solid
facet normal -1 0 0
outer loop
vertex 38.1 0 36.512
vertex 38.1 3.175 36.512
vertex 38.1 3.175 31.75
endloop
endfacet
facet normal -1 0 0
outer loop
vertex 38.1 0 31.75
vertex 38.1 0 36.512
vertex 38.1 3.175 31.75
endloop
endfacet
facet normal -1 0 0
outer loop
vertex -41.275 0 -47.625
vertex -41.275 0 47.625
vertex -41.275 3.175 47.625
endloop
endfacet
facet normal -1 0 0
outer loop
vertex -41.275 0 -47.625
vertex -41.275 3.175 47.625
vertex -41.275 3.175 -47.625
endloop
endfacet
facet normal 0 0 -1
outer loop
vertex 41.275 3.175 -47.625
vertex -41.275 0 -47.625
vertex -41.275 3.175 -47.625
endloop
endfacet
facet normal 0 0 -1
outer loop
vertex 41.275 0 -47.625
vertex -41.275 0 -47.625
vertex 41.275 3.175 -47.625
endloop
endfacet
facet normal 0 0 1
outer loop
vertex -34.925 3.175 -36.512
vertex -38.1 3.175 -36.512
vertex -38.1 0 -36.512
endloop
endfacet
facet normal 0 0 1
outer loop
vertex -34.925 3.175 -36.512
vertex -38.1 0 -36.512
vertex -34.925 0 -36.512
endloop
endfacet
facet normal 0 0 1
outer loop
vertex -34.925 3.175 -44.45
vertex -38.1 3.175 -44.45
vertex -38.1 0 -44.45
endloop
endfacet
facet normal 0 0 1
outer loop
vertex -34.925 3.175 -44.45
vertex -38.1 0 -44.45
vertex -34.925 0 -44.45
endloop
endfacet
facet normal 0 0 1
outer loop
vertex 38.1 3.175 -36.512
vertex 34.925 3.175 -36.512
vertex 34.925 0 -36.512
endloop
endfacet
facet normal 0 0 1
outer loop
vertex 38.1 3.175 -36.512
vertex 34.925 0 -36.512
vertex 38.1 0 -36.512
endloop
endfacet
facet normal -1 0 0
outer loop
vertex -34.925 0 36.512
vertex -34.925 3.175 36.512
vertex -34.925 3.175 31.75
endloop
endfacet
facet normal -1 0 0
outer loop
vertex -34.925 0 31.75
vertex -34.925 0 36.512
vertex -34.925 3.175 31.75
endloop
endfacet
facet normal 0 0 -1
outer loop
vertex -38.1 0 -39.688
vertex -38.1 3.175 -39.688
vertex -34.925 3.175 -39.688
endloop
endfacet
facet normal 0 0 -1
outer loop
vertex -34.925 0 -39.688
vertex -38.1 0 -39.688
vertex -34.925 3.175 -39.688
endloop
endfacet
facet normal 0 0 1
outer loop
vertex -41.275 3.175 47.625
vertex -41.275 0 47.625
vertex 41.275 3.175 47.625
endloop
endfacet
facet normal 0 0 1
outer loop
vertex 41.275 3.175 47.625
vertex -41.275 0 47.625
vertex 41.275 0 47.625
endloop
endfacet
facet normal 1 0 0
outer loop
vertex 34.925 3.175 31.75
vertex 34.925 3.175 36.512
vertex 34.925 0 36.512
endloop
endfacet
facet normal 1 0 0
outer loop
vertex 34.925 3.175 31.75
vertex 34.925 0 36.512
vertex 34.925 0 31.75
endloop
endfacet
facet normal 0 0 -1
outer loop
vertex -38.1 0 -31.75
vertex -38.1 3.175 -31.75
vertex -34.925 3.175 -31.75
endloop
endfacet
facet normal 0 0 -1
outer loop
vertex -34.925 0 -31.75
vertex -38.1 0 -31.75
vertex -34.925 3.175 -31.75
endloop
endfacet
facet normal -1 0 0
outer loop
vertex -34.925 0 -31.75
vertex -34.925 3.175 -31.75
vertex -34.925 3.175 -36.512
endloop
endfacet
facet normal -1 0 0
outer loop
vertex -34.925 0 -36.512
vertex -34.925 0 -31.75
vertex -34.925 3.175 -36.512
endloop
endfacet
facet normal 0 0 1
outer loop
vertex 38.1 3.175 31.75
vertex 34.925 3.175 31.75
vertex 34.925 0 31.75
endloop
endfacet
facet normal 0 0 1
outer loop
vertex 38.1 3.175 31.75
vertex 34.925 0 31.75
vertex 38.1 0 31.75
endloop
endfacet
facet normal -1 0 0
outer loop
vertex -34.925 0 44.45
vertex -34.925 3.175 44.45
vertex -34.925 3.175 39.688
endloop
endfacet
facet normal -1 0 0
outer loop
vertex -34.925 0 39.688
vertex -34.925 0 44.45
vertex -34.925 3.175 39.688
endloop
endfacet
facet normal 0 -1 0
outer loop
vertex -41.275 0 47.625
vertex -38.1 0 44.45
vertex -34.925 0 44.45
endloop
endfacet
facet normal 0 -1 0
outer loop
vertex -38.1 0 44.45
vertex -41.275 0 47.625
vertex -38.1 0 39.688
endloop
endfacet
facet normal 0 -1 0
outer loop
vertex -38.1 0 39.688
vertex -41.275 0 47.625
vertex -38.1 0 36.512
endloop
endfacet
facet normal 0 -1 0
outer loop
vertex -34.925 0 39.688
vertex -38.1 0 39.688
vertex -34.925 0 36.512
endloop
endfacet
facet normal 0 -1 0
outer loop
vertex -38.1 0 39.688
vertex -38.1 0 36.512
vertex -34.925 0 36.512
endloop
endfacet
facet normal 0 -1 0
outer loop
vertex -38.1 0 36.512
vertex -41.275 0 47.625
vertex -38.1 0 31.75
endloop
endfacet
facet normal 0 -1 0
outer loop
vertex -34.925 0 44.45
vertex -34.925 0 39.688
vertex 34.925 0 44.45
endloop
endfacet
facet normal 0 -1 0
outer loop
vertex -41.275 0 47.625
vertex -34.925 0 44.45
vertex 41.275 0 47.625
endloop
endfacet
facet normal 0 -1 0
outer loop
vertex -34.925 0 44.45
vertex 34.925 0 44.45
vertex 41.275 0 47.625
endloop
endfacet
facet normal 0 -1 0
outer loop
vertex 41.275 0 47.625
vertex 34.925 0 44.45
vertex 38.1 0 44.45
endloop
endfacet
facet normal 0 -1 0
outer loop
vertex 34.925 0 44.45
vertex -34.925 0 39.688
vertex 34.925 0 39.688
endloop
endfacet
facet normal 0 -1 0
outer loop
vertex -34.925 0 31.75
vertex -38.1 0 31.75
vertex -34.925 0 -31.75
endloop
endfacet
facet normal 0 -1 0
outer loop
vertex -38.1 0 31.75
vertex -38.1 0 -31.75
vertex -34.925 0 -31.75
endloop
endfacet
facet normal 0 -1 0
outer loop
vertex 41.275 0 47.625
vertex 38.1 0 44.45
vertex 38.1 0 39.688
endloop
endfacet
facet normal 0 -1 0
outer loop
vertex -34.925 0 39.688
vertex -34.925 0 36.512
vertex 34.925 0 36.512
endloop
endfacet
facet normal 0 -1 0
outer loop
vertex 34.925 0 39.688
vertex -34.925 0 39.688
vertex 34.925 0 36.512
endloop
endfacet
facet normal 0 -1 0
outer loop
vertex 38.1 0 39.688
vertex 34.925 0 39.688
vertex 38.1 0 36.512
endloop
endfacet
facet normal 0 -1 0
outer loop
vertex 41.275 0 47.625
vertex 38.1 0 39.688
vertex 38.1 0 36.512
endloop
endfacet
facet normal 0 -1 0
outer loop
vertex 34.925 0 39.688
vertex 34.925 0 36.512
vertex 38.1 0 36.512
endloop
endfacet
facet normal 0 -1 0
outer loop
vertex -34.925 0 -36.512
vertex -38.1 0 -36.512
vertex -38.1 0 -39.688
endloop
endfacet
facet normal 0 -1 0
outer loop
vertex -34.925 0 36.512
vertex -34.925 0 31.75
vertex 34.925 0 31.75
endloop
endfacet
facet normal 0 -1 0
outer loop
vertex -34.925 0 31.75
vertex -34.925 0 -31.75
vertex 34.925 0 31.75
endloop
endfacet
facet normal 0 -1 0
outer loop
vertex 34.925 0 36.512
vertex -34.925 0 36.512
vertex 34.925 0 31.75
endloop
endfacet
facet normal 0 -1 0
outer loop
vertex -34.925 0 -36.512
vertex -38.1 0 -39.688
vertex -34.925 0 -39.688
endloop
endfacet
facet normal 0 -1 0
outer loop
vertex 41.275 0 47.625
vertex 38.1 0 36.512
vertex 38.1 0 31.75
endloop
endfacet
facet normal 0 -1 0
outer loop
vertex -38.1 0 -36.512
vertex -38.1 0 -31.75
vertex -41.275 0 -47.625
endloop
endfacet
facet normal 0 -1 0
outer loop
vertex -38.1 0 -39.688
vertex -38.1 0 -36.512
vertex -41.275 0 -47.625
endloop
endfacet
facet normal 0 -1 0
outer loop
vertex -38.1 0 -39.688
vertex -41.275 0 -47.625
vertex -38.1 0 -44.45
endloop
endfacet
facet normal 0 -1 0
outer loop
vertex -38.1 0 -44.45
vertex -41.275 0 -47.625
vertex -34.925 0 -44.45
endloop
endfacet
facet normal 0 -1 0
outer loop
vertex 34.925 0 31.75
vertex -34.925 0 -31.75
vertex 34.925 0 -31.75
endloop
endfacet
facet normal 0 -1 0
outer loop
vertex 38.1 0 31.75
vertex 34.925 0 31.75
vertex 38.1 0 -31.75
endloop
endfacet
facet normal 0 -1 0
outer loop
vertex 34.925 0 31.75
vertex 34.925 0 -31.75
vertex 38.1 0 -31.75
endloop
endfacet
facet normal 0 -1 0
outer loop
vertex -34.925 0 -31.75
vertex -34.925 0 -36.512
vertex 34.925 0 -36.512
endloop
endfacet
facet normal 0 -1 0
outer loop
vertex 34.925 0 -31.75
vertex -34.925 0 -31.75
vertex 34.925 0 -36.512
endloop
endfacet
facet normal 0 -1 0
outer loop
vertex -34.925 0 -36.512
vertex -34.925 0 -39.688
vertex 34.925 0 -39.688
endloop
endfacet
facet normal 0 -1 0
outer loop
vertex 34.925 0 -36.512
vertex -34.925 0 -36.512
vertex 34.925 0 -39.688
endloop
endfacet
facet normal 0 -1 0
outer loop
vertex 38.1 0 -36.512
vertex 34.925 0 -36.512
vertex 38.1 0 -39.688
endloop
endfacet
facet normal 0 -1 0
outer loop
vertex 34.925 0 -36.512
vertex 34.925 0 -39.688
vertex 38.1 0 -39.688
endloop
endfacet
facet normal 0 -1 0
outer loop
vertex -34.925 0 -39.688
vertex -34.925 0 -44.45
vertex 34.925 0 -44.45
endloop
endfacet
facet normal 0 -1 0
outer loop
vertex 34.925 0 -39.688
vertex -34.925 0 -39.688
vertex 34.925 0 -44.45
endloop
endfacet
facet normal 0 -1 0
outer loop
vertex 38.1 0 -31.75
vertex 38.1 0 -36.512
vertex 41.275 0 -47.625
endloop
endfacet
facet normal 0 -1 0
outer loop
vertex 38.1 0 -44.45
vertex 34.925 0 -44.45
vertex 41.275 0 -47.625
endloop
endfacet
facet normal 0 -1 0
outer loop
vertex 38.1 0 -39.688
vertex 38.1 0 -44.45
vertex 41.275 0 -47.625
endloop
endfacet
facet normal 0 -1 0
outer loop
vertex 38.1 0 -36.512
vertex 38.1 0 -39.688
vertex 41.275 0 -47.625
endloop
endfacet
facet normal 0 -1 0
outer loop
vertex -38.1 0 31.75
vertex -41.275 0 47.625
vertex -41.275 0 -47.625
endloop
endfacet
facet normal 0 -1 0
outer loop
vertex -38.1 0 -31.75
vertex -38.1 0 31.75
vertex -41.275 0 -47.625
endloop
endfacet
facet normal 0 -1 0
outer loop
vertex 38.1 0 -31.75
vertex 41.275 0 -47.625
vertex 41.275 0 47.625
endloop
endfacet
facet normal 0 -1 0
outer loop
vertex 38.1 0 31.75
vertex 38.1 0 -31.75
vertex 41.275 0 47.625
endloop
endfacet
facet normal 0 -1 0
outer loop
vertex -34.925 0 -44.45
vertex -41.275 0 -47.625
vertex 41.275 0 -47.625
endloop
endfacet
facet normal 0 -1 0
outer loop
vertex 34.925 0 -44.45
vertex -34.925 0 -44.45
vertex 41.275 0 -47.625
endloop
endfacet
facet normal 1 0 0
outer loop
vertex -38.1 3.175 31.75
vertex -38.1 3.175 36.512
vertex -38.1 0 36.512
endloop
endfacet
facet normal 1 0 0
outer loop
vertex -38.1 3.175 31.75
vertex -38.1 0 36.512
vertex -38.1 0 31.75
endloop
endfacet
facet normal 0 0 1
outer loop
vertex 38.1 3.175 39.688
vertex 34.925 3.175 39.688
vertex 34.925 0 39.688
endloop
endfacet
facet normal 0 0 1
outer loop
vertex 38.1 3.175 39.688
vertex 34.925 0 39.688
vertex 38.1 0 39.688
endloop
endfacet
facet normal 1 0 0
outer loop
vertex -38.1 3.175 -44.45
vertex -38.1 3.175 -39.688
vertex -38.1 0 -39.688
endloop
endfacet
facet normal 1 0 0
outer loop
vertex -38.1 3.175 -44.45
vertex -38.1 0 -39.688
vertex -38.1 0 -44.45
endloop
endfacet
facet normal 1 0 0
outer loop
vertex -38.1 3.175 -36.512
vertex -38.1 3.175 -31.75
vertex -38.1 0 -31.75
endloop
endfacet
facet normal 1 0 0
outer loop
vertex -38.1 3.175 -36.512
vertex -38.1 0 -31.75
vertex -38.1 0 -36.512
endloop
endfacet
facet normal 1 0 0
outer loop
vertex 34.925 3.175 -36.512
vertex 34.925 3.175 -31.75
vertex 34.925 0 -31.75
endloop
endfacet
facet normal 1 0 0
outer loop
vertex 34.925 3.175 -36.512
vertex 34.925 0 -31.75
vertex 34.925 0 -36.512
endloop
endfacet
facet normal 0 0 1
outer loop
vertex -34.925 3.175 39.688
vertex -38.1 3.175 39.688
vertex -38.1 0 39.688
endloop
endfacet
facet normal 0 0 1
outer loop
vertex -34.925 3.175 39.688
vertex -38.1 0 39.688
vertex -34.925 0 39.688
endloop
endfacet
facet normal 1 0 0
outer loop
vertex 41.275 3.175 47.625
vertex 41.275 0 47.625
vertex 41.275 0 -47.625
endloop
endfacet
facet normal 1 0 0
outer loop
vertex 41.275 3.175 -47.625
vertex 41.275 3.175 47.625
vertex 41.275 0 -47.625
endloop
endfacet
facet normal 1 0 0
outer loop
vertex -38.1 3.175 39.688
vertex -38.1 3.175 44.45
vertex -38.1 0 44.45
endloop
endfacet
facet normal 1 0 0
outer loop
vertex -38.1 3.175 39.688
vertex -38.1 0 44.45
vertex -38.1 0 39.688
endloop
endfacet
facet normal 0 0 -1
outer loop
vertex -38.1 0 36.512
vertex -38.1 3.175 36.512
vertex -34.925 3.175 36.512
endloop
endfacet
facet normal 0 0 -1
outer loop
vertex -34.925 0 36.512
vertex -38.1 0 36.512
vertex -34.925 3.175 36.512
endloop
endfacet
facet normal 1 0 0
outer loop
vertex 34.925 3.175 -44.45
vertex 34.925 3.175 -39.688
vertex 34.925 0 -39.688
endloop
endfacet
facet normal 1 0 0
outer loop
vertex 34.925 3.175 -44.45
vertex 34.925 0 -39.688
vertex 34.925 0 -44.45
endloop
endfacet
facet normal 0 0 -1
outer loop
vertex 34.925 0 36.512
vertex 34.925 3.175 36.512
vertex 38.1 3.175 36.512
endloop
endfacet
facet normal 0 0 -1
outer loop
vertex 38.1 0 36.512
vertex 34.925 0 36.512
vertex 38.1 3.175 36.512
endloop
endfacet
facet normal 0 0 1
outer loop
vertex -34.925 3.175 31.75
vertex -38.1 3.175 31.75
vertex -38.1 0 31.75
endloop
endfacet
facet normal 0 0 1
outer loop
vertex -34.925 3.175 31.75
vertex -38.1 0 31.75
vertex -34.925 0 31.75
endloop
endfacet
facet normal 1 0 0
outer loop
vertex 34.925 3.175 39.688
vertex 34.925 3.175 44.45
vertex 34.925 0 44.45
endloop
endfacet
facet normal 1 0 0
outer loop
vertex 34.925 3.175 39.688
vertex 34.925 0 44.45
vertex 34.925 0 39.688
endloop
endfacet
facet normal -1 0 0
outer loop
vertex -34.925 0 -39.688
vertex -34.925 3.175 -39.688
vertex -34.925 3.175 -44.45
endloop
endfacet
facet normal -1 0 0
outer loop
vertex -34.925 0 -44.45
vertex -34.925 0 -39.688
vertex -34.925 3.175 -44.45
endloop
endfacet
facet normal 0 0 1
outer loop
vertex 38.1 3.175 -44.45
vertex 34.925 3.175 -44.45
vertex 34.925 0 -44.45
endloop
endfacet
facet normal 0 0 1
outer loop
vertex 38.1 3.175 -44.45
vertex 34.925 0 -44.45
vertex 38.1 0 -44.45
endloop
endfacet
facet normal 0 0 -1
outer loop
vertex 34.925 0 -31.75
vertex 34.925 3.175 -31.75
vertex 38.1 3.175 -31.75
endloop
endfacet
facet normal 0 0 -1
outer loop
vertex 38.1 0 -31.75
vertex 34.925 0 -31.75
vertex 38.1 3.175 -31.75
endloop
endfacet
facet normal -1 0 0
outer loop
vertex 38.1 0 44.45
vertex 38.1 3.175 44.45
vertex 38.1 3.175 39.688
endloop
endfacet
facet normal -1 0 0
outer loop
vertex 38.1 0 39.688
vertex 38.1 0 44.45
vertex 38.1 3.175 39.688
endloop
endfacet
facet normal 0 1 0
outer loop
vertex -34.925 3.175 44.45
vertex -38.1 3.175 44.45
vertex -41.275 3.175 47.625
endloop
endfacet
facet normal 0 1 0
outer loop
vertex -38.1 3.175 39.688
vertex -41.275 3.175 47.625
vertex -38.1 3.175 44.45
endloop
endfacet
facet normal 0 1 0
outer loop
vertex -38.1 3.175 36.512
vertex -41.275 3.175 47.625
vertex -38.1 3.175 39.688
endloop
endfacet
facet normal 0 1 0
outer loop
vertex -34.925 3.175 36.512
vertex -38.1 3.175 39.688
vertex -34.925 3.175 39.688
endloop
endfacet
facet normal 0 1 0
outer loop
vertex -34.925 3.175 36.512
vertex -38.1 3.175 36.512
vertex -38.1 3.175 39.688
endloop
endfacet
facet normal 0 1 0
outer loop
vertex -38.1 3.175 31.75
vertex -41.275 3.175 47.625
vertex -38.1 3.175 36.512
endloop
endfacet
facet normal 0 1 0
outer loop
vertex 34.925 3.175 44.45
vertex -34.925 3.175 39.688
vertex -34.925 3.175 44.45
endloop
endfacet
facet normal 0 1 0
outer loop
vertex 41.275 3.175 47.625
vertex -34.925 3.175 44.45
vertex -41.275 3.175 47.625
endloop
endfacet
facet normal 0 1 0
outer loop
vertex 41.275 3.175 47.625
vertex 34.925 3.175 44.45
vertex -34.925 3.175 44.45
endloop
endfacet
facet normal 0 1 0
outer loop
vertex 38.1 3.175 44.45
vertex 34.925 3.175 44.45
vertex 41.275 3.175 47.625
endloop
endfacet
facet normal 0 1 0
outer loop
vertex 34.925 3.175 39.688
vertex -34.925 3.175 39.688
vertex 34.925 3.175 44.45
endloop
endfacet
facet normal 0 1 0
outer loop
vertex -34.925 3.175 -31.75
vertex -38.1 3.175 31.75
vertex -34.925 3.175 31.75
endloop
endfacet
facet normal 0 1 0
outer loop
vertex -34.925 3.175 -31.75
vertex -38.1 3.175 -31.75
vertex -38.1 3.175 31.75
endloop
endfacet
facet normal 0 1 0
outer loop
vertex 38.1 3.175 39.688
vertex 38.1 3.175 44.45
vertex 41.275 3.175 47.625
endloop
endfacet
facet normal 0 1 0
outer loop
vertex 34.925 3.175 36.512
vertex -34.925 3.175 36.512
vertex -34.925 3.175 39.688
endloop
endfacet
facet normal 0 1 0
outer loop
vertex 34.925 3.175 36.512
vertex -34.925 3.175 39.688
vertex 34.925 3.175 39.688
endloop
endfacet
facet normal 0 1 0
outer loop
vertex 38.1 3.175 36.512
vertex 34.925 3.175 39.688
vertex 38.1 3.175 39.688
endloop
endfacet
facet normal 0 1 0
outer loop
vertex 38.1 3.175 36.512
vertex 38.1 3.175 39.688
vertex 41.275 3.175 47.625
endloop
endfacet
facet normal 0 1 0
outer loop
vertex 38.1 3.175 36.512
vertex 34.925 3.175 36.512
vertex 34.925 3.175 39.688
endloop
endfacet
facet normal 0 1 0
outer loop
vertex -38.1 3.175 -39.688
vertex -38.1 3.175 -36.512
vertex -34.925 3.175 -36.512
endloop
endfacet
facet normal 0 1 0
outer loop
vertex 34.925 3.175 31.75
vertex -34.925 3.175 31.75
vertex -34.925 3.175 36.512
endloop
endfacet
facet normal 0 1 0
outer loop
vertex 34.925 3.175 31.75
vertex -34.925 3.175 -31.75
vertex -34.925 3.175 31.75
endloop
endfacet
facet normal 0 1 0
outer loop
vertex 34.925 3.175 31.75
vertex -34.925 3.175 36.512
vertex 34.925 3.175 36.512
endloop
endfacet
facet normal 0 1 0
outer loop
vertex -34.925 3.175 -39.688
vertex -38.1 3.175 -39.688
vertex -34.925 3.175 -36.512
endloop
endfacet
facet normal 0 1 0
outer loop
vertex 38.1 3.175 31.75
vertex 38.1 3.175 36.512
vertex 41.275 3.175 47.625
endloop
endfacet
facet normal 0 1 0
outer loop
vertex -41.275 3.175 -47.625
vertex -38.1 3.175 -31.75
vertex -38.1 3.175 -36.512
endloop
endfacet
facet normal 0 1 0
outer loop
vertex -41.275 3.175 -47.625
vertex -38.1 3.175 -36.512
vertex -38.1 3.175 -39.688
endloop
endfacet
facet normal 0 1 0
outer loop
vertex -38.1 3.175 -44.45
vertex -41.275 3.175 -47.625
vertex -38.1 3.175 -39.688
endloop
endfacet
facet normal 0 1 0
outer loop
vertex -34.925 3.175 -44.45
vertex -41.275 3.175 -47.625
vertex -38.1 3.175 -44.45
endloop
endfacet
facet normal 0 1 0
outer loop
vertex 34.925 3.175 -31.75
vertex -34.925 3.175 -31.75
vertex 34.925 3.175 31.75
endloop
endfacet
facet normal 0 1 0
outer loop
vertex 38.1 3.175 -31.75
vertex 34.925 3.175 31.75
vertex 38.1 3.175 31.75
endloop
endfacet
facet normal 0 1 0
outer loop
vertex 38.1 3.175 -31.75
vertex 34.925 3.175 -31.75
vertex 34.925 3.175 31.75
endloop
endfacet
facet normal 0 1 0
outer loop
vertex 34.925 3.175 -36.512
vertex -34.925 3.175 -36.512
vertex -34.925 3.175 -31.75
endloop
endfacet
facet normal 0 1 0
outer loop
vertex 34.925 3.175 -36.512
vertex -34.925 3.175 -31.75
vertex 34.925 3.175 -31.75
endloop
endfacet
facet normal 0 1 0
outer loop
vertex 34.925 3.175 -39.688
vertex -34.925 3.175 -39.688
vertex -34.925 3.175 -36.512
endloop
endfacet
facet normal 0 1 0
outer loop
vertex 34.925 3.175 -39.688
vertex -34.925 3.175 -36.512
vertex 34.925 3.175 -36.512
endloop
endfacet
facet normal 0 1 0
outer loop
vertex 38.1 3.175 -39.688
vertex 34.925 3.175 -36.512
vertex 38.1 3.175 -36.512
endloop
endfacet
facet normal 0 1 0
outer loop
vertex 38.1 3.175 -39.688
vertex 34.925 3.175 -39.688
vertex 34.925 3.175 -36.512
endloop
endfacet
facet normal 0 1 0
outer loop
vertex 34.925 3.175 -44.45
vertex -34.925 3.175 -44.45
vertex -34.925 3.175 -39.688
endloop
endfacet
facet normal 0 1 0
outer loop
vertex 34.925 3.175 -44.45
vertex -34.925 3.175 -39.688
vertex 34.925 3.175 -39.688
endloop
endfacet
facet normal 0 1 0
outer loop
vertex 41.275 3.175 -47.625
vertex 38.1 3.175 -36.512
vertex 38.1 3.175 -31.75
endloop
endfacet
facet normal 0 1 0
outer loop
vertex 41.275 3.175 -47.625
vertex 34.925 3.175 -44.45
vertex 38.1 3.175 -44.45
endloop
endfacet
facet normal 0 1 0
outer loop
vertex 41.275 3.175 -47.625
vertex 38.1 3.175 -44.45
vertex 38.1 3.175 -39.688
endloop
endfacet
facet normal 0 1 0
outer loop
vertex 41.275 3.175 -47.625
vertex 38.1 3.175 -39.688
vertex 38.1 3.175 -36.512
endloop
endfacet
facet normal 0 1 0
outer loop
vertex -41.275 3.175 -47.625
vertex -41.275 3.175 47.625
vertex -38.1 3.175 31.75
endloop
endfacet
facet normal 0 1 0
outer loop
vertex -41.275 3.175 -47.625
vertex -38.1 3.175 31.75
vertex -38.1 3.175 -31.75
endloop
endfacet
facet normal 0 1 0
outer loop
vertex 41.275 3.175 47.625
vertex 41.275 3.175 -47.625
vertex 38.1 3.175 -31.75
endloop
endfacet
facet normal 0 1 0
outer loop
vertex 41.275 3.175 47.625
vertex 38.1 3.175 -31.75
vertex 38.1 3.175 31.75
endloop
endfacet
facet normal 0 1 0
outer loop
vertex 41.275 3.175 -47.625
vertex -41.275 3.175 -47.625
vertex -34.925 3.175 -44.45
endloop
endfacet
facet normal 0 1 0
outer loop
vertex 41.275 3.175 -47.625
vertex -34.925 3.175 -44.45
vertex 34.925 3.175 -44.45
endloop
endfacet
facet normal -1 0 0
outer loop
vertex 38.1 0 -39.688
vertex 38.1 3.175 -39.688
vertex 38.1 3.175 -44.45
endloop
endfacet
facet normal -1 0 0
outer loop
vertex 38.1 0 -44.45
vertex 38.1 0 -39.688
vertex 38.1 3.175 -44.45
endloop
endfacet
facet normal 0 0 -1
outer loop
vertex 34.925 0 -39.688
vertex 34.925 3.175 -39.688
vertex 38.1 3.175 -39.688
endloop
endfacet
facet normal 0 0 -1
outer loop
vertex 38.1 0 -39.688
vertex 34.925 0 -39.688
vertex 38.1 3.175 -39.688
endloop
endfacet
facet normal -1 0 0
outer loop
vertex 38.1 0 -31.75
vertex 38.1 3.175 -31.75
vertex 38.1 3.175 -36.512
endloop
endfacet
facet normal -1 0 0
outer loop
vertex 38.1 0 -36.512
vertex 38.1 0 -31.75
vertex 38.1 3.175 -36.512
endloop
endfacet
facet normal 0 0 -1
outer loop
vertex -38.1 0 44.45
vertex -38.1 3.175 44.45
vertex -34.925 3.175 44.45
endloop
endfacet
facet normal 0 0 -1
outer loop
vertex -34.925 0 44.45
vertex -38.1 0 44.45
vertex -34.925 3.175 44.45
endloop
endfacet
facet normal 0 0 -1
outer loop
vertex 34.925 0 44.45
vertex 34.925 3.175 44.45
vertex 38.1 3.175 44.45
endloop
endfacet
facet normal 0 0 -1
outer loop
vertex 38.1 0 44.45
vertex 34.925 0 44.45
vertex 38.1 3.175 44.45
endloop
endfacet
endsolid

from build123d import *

# Parameters (mm, degrees)
SKETCH1_W            = 82.55
SKETCH1_H            = 95.25
BOSS_EXTRUDE1_DEPTH  = 3.175
SKETCH2_W            = 3.175
SKETCH2_H            = 4.7625
CUT_EXTRUDE1_DEPTH   = 64.101876953
LPATTERN1_COUNT      = 2
LPATTERN1_PITCH      = 76.2
LPATTERN1_COUNT_DIR2 = 2
LPATTERN1_PITCH_DIR2 = 73.025


with BuildPart() as part:
    # Sketch1 → Boss-Extrude1 (new body)
    with BuildSketch(Plane(origin=(0, 0, 0), x_dir=(1, 0, 0), z_dir=(0, 1, 0))):
        Rectangle(SKETCH1_W, SKETCH1_H)
    extrude(amount=BOSS_EXTRUDE1_DEPTH)

    # Sketch2 → Cut-Extrude1 (cut, through all)
    with BuildSketch(Plane(origin=(0, 3.175, 0), x_dir=(1, 0, 0), z_dir=(0, 1, 0))):
        with Locations((-36.5125, 42.06875)):
            Rectangle(SKETCH2_W, SKETCH2_H)
        with Locations((-36.5125, 34.13125)):
            Rectangle(SKETCH2_W, SKETCH2_H)
    cut_extrude1 = extrude(amount=-CUT_EXTRUDE1_DEPTH, mode=Mode.SUBTRACT)

    # LPattern1: Cut-Extrude1 2 × 2
    with Locations(*[(j * LPATTERN1_PITCH_DIR2, 0, i * LPATTERN1_PITCH) for i in range(LPATTERN1_COUNT) for j in range(LPATTERN1_COUNT_DIR2) if (i, j) != (0, 0)]):
        add(cut_extrude1, mode=Mode.SUBTRACT)


solid = part.part
